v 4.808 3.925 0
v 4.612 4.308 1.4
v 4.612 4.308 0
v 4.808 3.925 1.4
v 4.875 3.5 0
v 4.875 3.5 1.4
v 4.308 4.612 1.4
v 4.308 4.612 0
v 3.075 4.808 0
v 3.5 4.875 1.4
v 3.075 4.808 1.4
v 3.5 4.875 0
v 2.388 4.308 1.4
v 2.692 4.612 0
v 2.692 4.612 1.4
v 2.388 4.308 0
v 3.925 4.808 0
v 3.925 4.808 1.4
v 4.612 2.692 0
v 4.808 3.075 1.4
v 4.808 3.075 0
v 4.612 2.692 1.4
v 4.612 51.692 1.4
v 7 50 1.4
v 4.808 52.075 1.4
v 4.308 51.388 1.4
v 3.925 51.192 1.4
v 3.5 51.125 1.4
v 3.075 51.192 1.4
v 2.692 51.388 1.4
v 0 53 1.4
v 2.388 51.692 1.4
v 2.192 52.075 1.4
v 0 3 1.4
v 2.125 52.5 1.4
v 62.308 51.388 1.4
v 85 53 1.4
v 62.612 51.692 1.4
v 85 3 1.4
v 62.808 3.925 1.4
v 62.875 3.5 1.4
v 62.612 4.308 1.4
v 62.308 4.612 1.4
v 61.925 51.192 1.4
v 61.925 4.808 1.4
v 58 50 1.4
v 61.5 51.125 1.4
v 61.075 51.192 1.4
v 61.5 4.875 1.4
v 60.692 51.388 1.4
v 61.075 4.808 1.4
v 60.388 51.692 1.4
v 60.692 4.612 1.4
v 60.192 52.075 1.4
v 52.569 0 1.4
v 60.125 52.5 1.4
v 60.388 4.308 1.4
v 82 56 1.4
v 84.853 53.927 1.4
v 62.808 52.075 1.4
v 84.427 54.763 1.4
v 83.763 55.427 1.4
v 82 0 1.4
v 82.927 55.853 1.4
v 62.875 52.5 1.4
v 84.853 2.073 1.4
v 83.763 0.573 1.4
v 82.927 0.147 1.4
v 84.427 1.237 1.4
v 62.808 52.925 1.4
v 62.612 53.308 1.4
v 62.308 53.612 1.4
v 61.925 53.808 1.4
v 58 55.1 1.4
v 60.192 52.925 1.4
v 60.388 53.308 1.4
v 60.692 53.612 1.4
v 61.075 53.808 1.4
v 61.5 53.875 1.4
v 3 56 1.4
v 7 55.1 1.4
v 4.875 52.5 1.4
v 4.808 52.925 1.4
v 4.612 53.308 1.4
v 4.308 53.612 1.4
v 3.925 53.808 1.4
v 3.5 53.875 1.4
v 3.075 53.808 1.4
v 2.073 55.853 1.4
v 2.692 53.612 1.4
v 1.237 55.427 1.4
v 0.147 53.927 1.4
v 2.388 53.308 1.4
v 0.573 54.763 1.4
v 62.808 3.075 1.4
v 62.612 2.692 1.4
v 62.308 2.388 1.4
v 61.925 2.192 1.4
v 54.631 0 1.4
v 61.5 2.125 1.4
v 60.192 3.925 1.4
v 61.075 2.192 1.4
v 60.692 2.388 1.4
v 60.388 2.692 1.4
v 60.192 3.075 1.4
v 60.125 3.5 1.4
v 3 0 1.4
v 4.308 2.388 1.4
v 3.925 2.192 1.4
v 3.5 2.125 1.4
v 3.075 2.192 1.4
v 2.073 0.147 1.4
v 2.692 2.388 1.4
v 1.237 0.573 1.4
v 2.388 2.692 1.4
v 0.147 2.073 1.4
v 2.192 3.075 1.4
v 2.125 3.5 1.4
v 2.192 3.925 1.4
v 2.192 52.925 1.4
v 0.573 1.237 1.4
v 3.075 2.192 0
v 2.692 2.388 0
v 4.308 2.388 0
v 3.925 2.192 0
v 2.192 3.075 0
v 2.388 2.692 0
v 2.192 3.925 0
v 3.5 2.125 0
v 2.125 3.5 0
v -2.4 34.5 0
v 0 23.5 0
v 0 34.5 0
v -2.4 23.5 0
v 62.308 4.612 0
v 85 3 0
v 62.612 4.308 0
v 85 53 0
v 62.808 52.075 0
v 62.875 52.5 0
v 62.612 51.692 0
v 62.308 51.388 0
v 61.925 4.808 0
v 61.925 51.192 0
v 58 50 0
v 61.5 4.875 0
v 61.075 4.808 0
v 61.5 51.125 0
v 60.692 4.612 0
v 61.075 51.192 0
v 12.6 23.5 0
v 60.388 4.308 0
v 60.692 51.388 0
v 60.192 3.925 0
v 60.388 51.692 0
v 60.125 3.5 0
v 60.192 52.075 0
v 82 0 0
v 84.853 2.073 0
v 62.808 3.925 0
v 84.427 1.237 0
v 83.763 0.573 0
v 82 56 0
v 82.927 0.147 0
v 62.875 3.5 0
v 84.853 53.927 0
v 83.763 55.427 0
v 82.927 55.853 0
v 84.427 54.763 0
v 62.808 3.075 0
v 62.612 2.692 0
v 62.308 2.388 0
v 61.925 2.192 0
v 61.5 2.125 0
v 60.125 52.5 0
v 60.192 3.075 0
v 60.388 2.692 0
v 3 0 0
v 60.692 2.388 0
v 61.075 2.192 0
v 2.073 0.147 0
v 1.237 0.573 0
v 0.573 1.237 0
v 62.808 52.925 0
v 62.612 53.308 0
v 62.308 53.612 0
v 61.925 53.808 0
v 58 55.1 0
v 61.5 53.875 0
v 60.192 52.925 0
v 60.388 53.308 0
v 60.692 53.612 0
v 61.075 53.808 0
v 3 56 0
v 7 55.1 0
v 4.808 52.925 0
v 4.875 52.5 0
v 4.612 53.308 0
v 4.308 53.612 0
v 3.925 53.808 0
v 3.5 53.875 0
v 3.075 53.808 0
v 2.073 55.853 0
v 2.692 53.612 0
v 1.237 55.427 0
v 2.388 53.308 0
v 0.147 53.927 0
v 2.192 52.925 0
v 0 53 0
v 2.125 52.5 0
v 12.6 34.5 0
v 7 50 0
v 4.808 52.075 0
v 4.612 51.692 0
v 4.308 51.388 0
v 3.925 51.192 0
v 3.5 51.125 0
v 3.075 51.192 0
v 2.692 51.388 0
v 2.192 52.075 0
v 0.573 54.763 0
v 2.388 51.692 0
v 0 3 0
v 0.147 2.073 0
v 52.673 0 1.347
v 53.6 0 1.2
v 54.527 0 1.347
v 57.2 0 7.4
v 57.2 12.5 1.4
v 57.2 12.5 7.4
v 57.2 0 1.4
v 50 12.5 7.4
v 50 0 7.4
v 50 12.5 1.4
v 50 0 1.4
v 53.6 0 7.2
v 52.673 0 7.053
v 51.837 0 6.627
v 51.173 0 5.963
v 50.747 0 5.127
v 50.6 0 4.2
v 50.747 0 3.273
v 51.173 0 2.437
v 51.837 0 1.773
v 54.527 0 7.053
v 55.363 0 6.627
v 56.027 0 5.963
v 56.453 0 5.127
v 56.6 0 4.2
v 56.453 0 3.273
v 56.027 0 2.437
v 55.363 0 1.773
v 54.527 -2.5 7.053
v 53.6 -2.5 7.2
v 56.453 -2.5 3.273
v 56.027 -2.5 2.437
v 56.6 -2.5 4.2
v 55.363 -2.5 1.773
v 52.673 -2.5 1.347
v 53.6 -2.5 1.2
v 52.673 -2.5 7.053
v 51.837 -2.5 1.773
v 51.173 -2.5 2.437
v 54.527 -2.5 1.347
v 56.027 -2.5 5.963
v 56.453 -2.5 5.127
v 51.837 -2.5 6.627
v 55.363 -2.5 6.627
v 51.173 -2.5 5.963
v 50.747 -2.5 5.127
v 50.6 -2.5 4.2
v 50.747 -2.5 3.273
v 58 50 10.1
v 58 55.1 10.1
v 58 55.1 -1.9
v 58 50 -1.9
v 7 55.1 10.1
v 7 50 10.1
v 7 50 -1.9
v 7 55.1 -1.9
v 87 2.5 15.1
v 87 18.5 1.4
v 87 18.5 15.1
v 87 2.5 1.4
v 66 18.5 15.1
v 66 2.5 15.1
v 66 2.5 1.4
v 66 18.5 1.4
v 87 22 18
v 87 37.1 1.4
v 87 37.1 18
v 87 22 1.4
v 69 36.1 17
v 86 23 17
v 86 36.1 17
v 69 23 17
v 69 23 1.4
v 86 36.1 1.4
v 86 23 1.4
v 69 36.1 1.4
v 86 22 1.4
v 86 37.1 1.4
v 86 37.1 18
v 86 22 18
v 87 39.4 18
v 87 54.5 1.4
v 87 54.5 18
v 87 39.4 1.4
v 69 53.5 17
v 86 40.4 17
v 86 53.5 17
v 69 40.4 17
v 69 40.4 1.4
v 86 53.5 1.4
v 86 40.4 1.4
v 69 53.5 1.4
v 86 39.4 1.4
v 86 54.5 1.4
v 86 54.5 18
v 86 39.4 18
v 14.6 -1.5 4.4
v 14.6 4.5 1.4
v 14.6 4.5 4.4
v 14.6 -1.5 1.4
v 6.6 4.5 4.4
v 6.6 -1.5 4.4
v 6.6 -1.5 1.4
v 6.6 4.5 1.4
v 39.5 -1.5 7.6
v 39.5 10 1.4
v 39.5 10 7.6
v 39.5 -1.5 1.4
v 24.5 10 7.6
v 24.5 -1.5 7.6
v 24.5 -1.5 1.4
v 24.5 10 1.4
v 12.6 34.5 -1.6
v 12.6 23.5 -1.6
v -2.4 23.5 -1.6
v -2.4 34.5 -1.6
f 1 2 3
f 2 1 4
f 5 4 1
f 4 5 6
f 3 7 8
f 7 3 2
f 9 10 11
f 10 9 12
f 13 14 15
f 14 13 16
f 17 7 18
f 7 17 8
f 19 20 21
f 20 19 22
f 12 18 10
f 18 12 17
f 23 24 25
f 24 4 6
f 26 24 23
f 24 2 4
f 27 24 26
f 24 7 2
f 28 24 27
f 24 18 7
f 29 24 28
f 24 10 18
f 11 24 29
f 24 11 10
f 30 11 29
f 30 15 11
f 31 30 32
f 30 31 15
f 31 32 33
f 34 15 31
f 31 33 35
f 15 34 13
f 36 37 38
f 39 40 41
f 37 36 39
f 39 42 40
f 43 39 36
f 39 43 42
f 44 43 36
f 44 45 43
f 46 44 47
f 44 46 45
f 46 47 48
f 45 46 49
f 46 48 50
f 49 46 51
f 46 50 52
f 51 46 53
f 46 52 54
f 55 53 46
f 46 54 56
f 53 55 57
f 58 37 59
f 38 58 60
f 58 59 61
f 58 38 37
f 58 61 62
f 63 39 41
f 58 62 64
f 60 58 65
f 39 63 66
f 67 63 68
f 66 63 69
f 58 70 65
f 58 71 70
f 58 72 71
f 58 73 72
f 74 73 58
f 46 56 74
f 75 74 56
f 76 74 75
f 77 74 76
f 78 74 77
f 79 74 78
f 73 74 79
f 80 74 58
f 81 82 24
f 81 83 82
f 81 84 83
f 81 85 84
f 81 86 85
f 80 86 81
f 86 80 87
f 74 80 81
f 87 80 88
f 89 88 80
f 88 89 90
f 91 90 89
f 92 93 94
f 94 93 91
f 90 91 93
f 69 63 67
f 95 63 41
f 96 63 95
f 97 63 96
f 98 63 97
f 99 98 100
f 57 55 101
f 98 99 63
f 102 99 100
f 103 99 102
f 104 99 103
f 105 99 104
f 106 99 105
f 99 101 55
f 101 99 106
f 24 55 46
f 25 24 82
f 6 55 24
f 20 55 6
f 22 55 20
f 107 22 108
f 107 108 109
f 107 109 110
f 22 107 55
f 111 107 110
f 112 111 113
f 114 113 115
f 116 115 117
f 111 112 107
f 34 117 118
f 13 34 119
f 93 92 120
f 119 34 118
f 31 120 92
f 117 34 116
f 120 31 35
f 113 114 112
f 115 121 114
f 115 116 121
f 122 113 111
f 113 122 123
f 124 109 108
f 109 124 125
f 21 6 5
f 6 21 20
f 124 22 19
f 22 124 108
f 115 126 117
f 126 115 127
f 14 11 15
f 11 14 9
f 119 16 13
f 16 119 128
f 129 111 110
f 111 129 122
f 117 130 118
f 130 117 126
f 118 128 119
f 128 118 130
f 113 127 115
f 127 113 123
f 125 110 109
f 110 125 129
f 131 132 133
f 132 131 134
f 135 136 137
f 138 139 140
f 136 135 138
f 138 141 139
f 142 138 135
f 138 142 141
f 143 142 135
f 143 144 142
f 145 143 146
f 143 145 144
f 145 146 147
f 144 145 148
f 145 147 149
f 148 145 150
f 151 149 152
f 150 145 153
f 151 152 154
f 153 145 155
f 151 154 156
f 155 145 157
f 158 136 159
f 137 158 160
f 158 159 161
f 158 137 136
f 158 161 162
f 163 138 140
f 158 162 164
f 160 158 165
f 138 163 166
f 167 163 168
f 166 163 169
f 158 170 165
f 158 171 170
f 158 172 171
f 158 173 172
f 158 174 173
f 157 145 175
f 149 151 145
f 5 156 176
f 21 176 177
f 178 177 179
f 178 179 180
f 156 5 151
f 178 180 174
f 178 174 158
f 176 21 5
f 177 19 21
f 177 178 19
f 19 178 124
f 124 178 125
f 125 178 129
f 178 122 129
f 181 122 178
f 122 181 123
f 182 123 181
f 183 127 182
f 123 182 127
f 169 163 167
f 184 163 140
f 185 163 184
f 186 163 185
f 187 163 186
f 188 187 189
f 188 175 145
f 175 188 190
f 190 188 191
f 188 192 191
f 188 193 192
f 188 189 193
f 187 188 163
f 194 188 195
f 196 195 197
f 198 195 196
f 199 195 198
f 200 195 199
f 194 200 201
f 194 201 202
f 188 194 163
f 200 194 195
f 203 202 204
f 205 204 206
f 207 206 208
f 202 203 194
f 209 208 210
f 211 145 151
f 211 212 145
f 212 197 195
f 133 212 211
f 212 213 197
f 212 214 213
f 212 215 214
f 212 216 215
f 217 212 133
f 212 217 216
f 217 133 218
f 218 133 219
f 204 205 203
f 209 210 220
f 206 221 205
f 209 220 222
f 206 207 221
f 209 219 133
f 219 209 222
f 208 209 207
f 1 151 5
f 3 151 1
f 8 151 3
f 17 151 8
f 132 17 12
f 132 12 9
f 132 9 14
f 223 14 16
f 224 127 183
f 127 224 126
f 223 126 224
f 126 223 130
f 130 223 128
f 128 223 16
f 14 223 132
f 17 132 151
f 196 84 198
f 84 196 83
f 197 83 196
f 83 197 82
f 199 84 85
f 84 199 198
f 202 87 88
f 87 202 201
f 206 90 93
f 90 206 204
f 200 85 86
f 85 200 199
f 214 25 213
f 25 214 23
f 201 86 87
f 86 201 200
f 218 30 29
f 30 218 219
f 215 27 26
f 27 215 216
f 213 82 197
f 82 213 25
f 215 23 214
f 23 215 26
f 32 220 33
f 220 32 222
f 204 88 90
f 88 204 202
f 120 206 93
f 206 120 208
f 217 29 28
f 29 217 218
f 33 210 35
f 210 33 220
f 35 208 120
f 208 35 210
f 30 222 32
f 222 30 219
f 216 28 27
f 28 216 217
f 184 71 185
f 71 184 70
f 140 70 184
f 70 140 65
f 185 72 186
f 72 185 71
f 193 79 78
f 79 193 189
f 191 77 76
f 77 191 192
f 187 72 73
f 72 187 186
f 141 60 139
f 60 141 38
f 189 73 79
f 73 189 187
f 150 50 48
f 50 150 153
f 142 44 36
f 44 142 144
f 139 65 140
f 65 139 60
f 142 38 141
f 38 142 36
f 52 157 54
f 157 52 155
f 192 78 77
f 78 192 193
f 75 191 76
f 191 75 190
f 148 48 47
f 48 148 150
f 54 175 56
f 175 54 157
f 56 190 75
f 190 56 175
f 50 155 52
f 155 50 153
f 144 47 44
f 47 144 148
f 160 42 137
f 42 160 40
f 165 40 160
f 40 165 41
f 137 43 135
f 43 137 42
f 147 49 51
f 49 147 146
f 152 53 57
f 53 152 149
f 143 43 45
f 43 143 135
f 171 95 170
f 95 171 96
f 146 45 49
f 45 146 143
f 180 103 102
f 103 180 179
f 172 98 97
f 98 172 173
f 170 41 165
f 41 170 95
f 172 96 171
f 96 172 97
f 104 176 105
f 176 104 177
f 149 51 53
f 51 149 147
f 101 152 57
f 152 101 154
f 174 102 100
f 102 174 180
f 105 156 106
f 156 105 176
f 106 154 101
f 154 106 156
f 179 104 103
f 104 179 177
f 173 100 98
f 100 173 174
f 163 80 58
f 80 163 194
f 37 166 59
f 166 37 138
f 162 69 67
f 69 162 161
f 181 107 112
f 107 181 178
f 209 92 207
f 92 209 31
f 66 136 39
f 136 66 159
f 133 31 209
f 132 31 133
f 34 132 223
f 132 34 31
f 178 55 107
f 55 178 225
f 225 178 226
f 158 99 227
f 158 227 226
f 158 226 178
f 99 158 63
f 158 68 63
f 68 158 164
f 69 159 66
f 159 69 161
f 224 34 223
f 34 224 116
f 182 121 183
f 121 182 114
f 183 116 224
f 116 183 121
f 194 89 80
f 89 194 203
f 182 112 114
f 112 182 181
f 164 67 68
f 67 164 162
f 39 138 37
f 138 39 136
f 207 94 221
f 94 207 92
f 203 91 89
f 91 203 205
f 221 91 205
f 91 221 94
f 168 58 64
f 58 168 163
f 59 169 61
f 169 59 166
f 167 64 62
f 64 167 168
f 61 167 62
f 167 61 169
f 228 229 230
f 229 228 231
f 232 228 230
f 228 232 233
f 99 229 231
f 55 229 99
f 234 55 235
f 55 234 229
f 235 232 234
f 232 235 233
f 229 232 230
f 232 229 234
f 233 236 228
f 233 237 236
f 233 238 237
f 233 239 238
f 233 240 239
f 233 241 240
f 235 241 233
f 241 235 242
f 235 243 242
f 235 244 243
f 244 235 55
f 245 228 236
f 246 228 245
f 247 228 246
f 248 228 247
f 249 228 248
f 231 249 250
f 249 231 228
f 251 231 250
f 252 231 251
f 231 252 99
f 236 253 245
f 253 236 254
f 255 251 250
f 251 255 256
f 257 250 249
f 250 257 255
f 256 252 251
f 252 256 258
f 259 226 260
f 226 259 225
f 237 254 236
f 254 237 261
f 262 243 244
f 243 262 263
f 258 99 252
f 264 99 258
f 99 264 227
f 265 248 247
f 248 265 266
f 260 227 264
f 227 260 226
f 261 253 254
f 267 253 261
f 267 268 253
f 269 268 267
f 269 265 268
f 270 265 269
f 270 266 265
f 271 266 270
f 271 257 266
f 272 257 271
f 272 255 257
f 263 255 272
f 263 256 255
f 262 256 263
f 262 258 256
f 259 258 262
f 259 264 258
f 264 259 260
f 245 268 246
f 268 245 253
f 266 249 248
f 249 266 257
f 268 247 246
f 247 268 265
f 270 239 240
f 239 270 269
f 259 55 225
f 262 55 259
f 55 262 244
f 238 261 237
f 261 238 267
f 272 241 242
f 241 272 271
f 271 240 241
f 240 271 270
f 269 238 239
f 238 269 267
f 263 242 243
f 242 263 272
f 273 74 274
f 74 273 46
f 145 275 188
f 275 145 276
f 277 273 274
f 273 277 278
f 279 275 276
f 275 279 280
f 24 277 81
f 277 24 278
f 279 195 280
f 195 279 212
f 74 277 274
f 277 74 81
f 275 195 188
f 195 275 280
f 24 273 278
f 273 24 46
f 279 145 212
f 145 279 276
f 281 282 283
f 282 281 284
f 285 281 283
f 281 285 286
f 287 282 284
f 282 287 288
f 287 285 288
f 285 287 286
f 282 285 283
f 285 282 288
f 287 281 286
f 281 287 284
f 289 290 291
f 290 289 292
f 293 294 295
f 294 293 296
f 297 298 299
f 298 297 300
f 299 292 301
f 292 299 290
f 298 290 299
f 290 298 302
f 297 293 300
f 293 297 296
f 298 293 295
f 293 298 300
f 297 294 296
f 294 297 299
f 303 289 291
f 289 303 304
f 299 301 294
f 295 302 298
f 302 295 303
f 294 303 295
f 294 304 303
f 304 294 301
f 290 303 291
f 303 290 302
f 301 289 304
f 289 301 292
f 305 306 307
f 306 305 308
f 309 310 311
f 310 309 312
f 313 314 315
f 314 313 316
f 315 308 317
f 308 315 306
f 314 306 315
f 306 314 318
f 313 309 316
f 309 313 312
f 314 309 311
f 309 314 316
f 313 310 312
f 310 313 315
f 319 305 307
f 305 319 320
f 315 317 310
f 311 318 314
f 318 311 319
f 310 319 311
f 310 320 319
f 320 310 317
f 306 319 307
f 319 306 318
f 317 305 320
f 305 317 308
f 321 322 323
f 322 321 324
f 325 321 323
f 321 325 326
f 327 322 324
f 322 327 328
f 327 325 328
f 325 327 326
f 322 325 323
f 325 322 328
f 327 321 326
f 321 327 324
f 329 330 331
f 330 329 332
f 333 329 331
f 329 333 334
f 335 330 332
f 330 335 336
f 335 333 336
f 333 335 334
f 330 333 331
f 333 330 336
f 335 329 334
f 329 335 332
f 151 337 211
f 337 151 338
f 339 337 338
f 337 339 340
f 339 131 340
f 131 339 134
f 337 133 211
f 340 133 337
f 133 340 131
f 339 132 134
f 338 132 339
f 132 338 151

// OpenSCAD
$fn = 20;

board_x=85;
board_y=56;
board_z=1.4;
board_r=3;
board_hole_d=2.75;
board_holes=[
  [ 3.5,  3.5  ],
  [ 3.5,  52.5 ],
  [ 61.5, 52.5 ],
  [ 61.5, 3.5  ]
];

pi3();

module pi3()
{
  color("green") 
  difference()
  {
    translate([board_r, board_r, 0])
    minkowski()
    {
      cube([board_x - board_r*2, board_y - board_r*2, board_z/2]);
      cylinder(r=board_r, h=board_z/2);
    }

    for(hole = board_holes) {
      translate(hole)
      cylinder(d=board_hole_d, h=board_z);
    };
  }

  translate([0, 0, board_z])
  {
    // header
    translate([7, board_y - 6, -3.3])
    cube([51, 5.1, 12]);

    // eth
    translate([66, 2.5, 0])
    cube([21, 16, 13.7]);

    // usb1
    translate([69, 23, 0])
    cube([18, 13.1, 15.6]);
    translate([86, 22, 0])
    cube([1, 15.1, 16.6]);
    
    // usb2
    translate([69, 40.4, 0])
    cube([18, 13.1, 15.6]);
    translate([86, 39.4, 0])
    cube([1, 15.1, 16.6]);
    
    // micro usb
    translate([6.6, -1.5, 0])
    cube([8, 6, 3]);

    // hdmi
    translate([24.5, -1.5, 0])
    cube([15, 11.5, 6.2]);

    // jack
    translate([50, -2.5, 0])
    {
      translate([0, 2.5, 0])
      cube([7.2, 12.5, 6]);

      translate([3.6, 0, 2.8])
      rotate([-90, 0, 0]) cylinder(d=6, h=2.5);
    }
  }

  // microSD card
  translate([-2.4, 23.5, -1.6])
  cube([15, 11, 1.6]);
}
